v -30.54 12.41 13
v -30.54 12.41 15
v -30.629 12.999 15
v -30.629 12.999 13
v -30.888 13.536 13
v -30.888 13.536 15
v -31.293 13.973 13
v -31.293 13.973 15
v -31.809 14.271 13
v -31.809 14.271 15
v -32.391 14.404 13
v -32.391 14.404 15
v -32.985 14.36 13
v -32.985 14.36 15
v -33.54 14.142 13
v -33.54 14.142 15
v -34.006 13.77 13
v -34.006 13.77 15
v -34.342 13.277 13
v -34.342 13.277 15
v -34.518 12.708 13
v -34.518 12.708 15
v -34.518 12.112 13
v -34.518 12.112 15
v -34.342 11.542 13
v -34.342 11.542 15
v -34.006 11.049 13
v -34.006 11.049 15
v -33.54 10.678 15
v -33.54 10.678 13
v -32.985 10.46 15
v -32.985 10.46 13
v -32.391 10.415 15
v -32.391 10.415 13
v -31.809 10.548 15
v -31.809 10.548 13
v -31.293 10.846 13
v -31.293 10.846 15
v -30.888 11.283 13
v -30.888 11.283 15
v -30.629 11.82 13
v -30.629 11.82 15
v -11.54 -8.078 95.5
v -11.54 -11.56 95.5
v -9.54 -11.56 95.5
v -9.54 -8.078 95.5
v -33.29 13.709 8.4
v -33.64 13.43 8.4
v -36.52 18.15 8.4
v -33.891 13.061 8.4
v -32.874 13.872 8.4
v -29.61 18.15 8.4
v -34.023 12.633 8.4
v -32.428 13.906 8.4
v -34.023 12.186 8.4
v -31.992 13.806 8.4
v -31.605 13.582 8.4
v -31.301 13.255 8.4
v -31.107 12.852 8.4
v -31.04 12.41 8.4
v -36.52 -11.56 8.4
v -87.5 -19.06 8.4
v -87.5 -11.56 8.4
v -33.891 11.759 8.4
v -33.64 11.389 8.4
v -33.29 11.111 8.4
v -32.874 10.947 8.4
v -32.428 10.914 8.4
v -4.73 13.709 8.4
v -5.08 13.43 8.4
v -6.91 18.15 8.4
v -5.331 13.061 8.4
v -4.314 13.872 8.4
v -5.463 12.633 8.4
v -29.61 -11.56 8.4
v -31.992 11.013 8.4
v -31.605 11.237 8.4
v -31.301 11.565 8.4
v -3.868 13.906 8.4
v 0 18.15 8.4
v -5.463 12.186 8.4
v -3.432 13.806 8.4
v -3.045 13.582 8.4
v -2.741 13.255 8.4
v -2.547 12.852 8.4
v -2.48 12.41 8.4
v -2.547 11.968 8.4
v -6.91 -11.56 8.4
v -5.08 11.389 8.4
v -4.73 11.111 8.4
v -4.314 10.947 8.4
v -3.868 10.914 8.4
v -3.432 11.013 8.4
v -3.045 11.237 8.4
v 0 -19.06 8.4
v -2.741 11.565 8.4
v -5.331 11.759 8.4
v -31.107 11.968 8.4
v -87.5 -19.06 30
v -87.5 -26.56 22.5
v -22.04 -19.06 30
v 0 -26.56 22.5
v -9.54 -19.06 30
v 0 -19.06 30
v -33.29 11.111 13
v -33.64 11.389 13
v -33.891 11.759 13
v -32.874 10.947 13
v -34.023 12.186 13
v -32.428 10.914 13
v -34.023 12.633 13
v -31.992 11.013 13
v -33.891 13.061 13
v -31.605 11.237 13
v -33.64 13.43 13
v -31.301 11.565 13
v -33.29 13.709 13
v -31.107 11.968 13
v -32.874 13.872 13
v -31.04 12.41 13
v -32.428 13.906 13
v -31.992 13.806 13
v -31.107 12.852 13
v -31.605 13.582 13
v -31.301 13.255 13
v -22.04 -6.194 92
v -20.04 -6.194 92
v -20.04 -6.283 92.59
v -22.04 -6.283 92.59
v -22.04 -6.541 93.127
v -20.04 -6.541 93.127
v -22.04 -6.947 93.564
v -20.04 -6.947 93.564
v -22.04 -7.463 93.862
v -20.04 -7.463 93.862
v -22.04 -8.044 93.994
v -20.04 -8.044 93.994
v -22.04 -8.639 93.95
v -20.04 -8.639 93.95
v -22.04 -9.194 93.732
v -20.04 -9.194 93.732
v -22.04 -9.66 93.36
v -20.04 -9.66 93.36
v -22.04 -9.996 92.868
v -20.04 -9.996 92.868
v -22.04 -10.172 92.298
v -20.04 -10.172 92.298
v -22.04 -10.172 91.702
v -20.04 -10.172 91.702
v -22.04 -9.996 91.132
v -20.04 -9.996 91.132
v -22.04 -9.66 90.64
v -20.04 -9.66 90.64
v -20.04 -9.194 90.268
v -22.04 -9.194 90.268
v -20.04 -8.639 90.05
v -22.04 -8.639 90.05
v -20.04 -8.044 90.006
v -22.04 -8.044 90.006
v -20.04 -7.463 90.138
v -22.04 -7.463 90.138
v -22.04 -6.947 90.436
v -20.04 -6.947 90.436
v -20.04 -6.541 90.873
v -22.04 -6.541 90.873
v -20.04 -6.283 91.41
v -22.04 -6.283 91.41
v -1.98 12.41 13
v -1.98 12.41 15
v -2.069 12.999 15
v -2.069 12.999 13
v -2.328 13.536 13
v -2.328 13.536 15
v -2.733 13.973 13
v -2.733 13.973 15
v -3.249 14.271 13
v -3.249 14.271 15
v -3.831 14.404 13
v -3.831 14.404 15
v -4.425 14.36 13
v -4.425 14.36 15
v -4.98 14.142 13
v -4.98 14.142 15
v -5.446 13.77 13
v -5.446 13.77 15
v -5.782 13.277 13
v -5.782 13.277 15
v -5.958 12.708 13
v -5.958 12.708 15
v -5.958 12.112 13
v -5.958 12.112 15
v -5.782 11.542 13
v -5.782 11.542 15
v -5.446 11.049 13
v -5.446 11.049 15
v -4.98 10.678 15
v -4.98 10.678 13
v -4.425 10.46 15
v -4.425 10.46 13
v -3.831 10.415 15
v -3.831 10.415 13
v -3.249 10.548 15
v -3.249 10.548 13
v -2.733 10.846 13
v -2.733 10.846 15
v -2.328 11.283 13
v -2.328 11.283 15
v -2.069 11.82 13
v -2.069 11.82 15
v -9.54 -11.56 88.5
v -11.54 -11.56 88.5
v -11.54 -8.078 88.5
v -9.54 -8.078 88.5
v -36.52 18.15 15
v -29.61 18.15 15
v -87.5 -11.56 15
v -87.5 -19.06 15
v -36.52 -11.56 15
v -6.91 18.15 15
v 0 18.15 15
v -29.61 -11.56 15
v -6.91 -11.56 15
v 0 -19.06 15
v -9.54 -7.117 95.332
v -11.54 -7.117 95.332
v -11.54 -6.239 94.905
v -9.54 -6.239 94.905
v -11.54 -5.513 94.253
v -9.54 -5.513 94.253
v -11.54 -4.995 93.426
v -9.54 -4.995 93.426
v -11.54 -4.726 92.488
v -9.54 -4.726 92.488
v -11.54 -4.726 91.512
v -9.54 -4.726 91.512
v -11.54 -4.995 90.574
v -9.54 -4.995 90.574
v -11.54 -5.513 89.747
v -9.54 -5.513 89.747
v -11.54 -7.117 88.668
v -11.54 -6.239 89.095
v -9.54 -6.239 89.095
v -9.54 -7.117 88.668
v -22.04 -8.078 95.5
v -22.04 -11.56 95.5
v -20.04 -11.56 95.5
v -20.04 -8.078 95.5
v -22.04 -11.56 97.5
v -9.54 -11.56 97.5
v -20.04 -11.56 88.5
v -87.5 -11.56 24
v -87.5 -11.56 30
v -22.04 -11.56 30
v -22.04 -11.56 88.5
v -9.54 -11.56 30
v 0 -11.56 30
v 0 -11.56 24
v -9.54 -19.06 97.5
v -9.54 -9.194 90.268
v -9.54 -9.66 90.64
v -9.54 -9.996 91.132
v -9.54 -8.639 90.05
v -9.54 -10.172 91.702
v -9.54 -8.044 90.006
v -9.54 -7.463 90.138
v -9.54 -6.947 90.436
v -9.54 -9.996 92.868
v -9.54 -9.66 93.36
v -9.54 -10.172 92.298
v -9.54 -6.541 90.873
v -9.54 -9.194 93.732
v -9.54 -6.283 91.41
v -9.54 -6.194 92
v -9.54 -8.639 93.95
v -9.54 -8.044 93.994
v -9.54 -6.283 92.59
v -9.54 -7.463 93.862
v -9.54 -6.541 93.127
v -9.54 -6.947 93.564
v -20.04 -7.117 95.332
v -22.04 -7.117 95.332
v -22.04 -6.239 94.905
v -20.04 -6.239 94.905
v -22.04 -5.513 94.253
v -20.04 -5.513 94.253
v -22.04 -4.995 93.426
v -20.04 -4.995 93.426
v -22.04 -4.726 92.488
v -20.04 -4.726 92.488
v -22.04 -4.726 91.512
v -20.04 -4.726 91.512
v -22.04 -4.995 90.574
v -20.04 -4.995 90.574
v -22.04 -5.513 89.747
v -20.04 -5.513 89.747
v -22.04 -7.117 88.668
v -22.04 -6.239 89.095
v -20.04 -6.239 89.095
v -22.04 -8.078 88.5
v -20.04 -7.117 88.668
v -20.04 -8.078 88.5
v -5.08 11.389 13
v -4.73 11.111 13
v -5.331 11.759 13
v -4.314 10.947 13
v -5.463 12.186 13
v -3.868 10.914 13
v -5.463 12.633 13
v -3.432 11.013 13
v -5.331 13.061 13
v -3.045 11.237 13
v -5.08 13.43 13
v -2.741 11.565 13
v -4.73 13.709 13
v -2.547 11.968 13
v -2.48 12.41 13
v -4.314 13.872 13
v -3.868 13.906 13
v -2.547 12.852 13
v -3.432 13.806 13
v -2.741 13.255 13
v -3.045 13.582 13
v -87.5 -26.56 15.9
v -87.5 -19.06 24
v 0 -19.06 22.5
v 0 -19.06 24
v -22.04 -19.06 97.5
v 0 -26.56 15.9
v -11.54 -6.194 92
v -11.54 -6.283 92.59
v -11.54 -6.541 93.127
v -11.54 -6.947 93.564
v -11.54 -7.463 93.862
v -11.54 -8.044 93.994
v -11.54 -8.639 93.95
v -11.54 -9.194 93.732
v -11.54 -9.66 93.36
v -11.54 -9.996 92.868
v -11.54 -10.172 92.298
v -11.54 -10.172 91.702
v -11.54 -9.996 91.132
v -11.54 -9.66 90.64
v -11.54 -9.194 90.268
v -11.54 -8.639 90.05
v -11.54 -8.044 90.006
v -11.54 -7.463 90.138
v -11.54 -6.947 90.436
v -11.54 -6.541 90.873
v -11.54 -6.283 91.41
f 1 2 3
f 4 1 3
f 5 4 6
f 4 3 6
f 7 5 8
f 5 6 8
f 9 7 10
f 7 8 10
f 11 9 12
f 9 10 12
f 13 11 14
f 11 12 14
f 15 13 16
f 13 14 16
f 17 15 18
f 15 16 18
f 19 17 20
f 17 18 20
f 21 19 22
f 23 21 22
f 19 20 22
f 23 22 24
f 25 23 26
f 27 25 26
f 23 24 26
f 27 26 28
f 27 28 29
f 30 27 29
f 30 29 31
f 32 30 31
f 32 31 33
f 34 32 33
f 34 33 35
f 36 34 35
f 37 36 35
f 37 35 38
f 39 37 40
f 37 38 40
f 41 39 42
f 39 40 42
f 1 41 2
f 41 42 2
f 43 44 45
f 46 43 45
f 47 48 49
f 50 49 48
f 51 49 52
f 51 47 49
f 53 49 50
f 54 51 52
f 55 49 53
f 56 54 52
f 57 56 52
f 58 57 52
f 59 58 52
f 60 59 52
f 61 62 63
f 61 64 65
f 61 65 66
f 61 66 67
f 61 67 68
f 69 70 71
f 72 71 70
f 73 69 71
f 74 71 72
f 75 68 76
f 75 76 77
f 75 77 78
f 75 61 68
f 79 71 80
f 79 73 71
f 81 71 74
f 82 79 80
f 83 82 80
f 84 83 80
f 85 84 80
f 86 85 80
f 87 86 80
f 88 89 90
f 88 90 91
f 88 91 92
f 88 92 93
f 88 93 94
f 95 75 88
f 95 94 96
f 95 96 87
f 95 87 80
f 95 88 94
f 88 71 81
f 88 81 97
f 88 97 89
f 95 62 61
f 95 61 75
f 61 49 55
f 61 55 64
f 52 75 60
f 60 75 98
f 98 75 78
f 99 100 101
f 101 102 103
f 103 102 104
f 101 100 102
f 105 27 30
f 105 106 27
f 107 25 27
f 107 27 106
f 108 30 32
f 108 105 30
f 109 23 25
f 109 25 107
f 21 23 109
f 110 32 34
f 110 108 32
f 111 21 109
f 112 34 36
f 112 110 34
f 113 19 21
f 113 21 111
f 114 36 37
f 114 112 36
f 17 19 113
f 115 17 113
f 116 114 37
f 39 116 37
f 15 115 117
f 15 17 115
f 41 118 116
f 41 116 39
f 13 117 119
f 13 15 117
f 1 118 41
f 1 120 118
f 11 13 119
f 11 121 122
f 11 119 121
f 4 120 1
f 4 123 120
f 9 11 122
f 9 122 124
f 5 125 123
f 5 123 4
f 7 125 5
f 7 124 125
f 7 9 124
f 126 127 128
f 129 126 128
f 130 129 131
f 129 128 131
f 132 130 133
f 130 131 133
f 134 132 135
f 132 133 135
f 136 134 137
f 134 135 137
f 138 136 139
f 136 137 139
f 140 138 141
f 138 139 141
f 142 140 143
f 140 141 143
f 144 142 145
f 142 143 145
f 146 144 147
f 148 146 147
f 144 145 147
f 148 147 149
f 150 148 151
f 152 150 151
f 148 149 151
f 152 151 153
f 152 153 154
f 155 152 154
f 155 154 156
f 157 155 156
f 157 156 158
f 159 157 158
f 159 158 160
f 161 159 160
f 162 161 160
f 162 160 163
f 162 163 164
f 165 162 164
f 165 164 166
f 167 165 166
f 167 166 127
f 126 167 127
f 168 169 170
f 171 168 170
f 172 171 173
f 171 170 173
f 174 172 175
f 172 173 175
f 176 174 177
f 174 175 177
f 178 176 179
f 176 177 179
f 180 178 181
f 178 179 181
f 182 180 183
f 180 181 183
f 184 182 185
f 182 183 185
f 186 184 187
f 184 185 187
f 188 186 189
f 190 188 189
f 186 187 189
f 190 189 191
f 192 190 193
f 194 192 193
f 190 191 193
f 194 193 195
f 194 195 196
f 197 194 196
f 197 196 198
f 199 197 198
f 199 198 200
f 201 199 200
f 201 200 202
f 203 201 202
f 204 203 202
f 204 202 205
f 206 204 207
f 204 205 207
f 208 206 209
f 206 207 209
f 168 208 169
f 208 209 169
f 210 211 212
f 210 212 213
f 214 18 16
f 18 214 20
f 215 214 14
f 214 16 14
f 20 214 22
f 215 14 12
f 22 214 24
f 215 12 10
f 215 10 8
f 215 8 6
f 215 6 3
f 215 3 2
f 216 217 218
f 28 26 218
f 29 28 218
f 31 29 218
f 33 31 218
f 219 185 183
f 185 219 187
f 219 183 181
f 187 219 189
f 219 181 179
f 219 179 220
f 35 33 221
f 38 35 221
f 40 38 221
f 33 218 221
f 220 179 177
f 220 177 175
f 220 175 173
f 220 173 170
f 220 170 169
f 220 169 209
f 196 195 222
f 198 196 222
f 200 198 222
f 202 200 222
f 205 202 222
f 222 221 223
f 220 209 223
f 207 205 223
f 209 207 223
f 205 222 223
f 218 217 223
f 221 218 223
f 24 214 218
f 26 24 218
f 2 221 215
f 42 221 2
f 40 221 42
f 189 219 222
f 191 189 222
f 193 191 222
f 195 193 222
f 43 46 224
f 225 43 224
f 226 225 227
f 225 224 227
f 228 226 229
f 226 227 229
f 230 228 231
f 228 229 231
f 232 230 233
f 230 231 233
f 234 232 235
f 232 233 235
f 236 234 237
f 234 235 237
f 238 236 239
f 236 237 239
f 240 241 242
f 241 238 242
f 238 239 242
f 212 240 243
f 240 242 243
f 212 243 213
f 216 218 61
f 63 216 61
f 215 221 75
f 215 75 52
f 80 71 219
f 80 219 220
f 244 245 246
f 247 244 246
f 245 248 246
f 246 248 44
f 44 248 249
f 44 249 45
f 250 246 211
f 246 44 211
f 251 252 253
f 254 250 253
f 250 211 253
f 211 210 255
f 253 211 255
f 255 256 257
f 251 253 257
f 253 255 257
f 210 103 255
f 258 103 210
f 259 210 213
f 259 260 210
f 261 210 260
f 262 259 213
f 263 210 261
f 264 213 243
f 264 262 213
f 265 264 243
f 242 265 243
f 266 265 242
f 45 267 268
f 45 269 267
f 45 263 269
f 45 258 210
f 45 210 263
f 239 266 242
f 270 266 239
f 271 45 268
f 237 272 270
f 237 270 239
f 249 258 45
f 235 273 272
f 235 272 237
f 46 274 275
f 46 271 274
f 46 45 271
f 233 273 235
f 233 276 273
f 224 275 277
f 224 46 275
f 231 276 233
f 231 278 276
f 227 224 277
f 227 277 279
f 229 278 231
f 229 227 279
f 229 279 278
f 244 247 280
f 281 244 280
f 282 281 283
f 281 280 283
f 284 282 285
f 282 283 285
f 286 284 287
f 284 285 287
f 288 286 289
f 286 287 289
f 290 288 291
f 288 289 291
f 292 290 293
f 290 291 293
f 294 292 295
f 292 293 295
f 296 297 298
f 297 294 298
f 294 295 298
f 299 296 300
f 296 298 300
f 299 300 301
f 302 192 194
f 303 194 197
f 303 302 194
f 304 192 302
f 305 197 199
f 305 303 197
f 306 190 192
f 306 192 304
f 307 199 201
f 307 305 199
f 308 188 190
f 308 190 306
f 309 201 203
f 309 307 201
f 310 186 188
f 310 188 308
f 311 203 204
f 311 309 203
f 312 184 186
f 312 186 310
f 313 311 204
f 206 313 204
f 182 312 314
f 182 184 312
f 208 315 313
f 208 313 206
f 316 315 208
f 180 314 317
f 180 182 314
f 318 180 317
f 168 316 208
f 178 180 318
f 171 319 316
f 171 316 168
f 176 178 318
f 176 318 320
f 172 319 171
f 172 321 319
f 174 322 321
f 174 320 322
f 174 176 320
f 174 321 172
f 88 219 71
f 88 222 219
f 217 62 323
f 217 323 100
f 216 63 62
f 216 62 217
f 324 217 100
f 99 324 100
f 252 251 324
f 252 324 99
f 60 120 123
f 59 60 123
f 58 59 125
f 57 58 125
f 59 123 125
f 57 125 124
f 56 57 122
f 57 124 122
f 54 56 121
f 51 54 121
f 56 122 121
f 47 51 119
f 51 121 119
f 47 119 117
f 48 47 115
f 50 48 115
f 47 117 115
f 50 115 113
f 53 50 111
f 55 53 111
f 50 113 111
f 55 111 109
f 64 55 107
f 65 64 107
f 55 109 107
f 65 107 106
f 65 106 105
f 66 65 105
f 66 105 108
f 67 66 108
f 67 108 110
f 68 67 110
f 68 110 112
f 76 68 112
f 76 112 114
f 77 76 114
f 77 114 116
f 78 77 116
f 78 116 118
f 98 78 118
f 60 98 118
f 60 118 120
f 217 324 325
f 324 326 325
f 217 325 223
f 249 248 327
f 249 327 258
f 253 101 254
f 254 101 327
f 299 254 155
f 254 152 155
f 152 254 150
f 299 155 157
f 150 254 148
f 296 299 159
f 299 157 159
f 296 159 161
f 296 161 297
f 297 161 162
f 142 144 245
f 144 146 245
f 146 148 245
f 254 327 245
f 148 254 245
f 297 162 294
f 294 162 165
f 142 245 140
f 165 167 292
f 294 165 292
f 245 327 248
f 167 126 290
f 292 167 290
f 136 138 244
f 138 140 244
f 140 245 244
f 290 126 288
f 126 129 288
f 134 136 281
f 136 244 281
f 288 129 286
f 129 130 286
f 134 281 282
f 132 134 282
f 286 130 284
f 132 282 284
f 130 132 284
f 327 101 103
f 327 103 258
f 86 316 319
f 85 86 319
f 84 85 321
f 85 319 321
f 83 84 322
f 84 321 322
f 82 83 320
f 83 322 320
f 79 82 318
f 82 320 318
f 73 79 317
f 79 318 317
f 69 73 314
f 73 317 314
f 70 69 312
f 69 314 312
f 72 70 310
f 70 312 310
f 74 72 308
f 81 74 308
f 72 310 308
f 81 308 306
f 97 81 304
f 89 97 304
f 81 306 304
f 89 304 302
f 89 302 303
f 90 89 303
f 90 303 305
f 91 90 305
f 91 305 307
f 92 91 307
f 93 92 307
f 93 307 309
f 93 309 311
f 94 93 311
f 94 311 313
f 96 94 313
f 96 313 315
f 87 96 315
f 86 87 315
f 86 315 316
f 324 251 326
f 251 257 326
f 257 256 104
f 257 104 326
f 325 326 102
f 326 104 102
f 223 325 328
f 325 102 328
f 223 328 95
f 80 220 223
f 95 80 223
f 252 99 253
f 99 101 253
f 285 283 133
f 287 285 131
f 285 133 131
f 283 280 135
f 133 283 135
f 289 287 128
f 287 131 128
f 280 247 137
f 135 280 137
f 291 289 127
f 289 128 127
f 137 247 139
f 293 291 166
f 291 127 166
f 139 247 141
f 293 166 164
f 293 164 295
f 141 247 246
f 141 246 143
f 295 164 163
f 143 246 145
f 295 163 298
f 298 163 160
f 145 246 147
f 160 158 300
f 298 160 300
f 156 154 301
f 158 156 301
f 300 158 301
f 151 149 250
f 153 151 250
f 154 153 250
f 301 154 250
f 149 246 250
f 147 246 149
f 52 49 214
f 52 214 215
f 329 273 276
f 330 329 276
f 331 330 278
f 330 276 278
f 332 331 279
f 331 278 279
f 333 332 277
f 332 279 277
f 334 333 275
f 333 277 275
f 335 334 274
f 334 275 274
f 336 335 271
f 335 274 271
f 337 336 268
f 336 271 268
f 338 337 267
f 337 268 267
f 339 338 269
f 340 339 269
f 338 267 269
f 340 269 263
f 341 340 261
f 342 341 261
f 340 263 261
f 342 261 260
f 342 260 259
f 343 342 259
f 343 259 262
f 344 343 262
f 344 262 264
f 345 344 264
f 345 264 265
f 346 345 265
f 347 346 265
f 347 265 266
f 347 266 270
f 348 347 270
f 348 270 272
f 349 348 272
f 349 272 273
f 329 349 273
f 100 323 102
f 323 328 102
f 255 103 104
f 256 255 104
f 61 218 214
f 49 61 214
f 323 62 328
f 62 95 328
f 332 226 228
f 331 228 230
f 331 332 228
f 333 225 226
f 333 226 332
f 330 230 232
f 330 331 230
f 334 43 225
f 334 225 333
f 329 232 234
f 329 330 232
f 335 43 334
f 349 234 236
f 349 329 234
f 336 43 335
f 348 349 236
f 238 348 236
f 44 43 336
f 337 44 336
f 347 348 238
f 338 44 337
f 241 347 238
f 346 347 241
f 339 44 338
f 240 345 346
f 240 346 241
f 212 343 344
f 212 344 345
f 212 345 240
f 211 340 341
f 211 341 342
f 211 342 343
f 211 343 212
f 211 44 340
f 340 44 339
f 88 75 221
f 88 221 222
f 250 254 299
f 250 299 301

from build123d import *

# Parameters (mm, degrees)
BOSS_EXTRUDE1_DEPTH     = 15
SKETCH2_W               = 71.983860539
SKETCH2_H               = 7.5
BOSS_EXTRUDE2_DEPTH     = 15
SKETCH3_W               = 71.983860539
SKETCH3_H               = 7.5
BOSS_EXTRUDE3_DEPTH     = 7.5
SKETCH4_W               = 8.4
SKETCH4_H               = 26.56
CUT_EXTRUDE1_DEPTH      = 83.383916987
SKETCH5_W               = 71.983860539
SKETCH5_H               = 10
BOSS_EXTRUDE4_DEPTH     = 23.8
SKETCH6_W               = 61.591879109
SKETCH6_H               = 40.125144004
CUT_EXTRUDE2_DEPTH      = 1.984
ESQUISSE1_W             = 10.09
ESQUISSE1_H             = 11.56
ENL_V_MAT_EXTRU_1_DEPTH = 10
ESQUISSE2_W             = 4.91
ESQUISSE2_H             = 11.56
BOSS_EXTRU_1_DEPTH      = 6.6
ESQUISSE3_W             = 12.5
ESQUISSE3_H             = 15
BOSS_EXTRU_5_DEPTH      = 67.5
ESQUISSE4_W             = 22.7
ESQUISSE4_H             = 17.2
BOSS_EXTRU_6_DEPTH      = 5
ESQUISSE5_W             = 15
ESQUISSE5_H             = 11.56
ENL_V_MAT_EXTRU_4_DEPTH = 117.379654903
SKETCH7_W               = 1.5
SKETCH7_H               = 7.5
CUT_EXTRUDE3_DEPTH      = 123.929508563
BOSS_EXTRUDE5_REACH     = 137.469
SKETCH8_W               = 2
SKETCH8_H               = 15
SKETCH9_W               = 2
SKETCH9_H               = 15
CUT_EXTRUDE4_DEPTH      = 67.5
BOSS_EXTRUDE6_START     = -6.6
SKETCH10_W              = 2
SKETCH10_H              = 11.56
BOSS_EXTRUDE6_DEPTH     = 6.6
SKETCH12_W              = 2
SKETCH12_H              = 11.56
CUT_EXTRUDE6_DEPTH      = 112.407648191
SKETCH13_W              = 4
SKETCH13_H              = 11.56
BOSS_EXTRUDE7_DEPTH     = 6.6
SKETCH14_W              = 2
SKETCH14_H              = 17.2
CUT_EXTRUDE7_DEPTH      = 5
SKETCH15_W              = 2
SKETCH15_H              = 17.2
BOSS_EXTRUDE8_DEPTH     = 15
SKETCH16_W              = 40.389860539
SKETCH16_H              = 23.8
CUT_EXTRUDE8_DEPTH      = 122.16296495
SKETCH21_W              = 6.91
SKETCH21_H              = 23.8
CUT_EXTRUDE11_DEPTH     = 122.16296495
SKETCH22_W              = 22.7
SKETCH22_H              = 6.6
CUT_EXTRUDE12_DEPTH     = 122.16296495
SKETCH23_W              = 17.2
SKETCH23_H              = 7.5
CUT_EXTRUDE13_DEPTH     = 109.825660735
SKETCH26_R              = 1.05
CUT_EXTRUDE15_DEPTH     = 117.379654903
SKETCH27_R              = 1.05
CUT_EXTRUDE16_DEPTH     = 117.379654903
SKETCH28_W              = 67.5
SKETCH28_H              = 7.5
CUT_EXTRUDE17_DEPTH     = 112.85629988
CUT_EXTRUDE18_DEPTH     = 123.929508563
CUT_EXTRUDE19_DEPTH     = 123.929508563
SKETCH32_W              = 2
SKETCH32_H              = 7
BOSS_EXTRUDE10_DEPTH    = 10
SKETCH33_W              = 2
SKETCH33_H              = 7
BOSS_EXTRUDE11_DEPTH    = 10
CUT_EXTRUDE20_DEPTH     = 118.758559504
CUT_EXTRUDE21_DEPTH     = 118.758559504
SKETCH40_R              = 2
CUT_EXTRUDE22_DEPTH     = 118.758559504
BOSS_EXTRUDE12_DEPTH    = 17.5
SKETCH42_W              = 6.91
SKETCH42_H              = 6.6
BOSS_EXTRUDE13_DEPTH    = 18.14971438
SKETCH43_R              = 1.5
CUT_EXTRUDE23_DEPTH     = 124.158065892
SKETCH44_R              = 2
CUT_EXTRUDE24_DEPTH     = 2
SKETCH45_W              = 3.244883141
SKETCH45_H              = 3.430305034
SKETCH45_W_2            = 4.17199261
BOSS_EXTRUDE14_DEPTH    = 6.6
SKETCH46_W              = 22.7
SKETCH46_H              = 17.2
CUT_EXTRUDE25_DEPTH     = 135.332210295


with BuildPart() as part:
    # Sketch1 → Boss-Extrude1 (new body)
    with BuildSketch(Plane.XY):
        Polygon((0, 0), (0, -26.56), (-71.983860539, -26.56), (-71.983860539, -11.56), (-52.61, -11.56), (-52.61, 0), (-37.61, 0), (-37.61, -11.56), (-15, -11.56), (-15, 0), align=None)
    extrude(amount=BOSS_EXTRUDE1_DEPTH)

    # Sketch2 → Boss-Extrude2 (add)
    with BuildSketch(Plane.XY.offset(15)):
        with Locations((-35.99193027, -22.81)):
            Rectangle(SKETCH2_W, SKETCH2_H)
    extrude(amount=BOSS_EXTRUDE2_DEPTH)

    # Sketch3 → Boss-Extrude3 (add)
    with BuildSketch(Plane(origin=(0, -19.06, 0), x_dir=(1, 0, 0), z_dir=(0, 1, 0))):
        with Locations((-35.99193027, -26.25)):
            Rectangle(SKETCH3_W, SKETCH3_H)
    extrude(amount=BOSS_EXTRUDE3_DEPTH)

    # Sketch4 → Cut-Extrude1 (cut, through all)
    with BuildSketch(Plane(origin=(0, 0, 0), x_dir=(0, 0, -1), z_dir=(1, 0, 0))):
        with Locations((-4.2, -13.28)):
            Rectangle(SKETCH4_W, SKETCH4_H)
    extrude(amount=-CUT_EXTRUDE1_DEPTH, mode=Mode.SUBTRACT)

    # Sketch5 → Boss-Extrude4 (add)
    with BuildSketch(Plane(origin=(0, 0, 8.4), x_dir=(-1, 0, 0), z_dir=(0, 0, -1))):
        with Locations((35.99193027, -21.56)):
            Rectangle(SKETCH5_W, SKETCH5_H)
    extrude(amount=BOSS_EXTRUDE4_DEPTH)

    # Sketch6 → Cut-Extrude2 (cut)
    with BuildSketch(Plane.ZY.offset(71.983860539)):
        with Locations((3.866783639, -17.156311896)):
            Rectangle(SKETCH6_W, SKETCH6_H)
    extrude(amount=-CUT_EXTRUDE2_DEPTH, mode=Mode.SUBTRACT)

    # Esquisse1 → Enlèv. mat.-Extru.1 (cut)
    with BuildSketch(Plane.XY.offset(15)):
        with Locations((-9.955, -5.78)):
            Rectangle(ESQUISSE1_W, ESQUISSE1_H)
    extrude(amount=-ENL_V_MAT_EXTRU_1_DEPTH, mode=Mode.SUBTRACT)

    # Esquisse2 → Boss.-Extru.1 (add)
    with BuildSketch(Plane(origin=(0, 0, 8.4), x_dir=(-1, 0, 0), z_dir=(0, 0, -1))):
        with Locations((30.065, -5.78)):
            Rectangle(ESQUISSE2_W, ESQUISSE2_H)
    extrude(amount=-BOSS_EXTRU_1_DEPTH)

    # Esquisse3 → Boss.-Extru.5 (add)
    with BuildSketch(Plane.XY.offset(30)):
        with Locations((-13.79, -19.06)):
            Rectangle(ESQUISSE3_W, ESQUISSE3_H)
    extrude(amount=BOSS_EXTRU_5_DEPTH)

    # Esquisse4 → Boss.-Extru.6 (add)
    with BuildSketch(Plane(origin=(0, -16.56, 0), x_dir=(1, 0, 0), z_dir=(0, 1, 0))):
        with Locations((-16.26, 0.2)):
            Rectangle(ESQUISSE4_W, ESQUISSE4_H)
    extrude(amount=BOSS_EXTRU_6_DEPTH)

    # Esquisse5 → Enlèv. mat.-Extru.4 (cut, through all)
    with BuildSketch(Plane(origin=(0, 0, 8.4), x_dir=(-1, 0, 0), z_dir=(0, 0, -1))):
        with Locations((45.11, -5.78)):
            Rectangle(ESQUISSE5_W, ESQUISSE5_H)
    extrude(amount=-ENL_V_MAT_EXTRU_4_DEPTH, mode=Mode.SUBTRACT)

    # Sketch7 → Cut-Extrude3 (cut, through all)
    with BuildSketch(Plane(origin=(0, 0, 0), x_dir=(0, 0, -1), z_dir=(1, 0, 0))):
        with Locations((-23.25, -15.31)):
            Rectangle(SKETCH7_W, SKETCH7_H)
    extrude(amount=-CUT_EXTRUDE3_DEPTH, mode=Mode.SUBTRACT)

    # Sketch8 → Boss-Extrude5 (add, up to next)
    with BuildSketch(Plane.XY.offset(97.5), mode=Mode.PRIVATE) as boss_extrude5_sk1:
        with Locations((-21.04, -19.06)):
            Rectangle(SKETCH8_W, SKETCH8_H)
    boss_extrude5_tool1 = extrude(boss_extrude5_sk1.sketch, amount=-BOSS_EXTRUDE5_REACH, mode=Mode.PRIVATE) - part.part
    add(boss_extrude5_tool1.solids().sort_by_distance((-21.04, -19.06, 97.5))[0])

    # Sketch9 → Cut-Extrude4 (cut)
    with BuildSketch(Plane.XY.offset(97.5)):
        with Locations((-8.54, -19.06)):
            Rectangle(SKETCH9_W, SKETCH9_H)
    extrude(amount=-CUT_EXTRUDE4_DEPTH, mode=Mode.SUBTRACT)

    # Sketch10 → Boss-Extrude6 (add)
    with BuildSketch(Plane.XY.offset(15).offset(BOSS_EXTRUDE6_START)):
        with Locations((-5.91, -5.78)):
            Rectangle(SKETCH10_W, SKETCH10_H)
    extrude(amount=BOSS_EXTRUDE6_DEPTH)

    # Sketch12 → Cut-Extrude6 (cut, through all)
    with BuildSketch(Plane.XY.offset(15)):
        with Locations((-28.61, -5.78)):
            Rectangle(SKETCH12_W, SKETCH12_H)
    extrude(amount=-CUT_EXTRUDE6_DEPTH, mode=Mode.SUBTRACT)

    # Sketch13 → Boss-Extrude7 (add)
    with BuildSketch(Plane.XY.offset(15)):
        with Locations((-34.52, -5.78)):
            Rectangle(SKETCH13_W, SKETCH13_H)
    extrude(amount=-BOSS_EXTRUDE7_DEPTH)

    # Sketch14 → Cut-Extrude7 (cut)
    with BuildSketch(Plane(origin=(0, -11.56, 0), x_dir=(1, 0, 0), z_dir=(0, 1, 0))):
        with Locations((-5.91, 0.2)):
            Rectangle(SKETCH14_W, SKETCH14_H)
    extrude(amount=-CUT_EXTRUDE7_DEPTH, mode=Mode.SUBTRACT)

    # Sketch15 → Boss-Extrude8 (add)
    with BuildSketch(Plane(origin=(0, -11.56, 0), x_dir=(1, 0, 0), z_dir=(0, 1, 0))):
        with Locations((-28.61, 0.2)):
            Rectangle(SKETCH15_W, SKETCH15_H)
    extrude(amount=-BOSS_EXTRUDE8_DEPTH)

    # Sketch16 → Cut-Extrude8 (cut, through all)
    with BuildSketch(Plane(origin=(0, -16.56, 0), x_dir=(1, 0, 0), z_dir=(0, 1, 0))):
        with Locations((-49.80493027, 3.5)):
            Rectangle(SKETCH16_W, SKETCH16_H)
    extrude(amount=-CUT_EXTRUDE8_DEPTH, mode=Mode.SUBTRACT)

    # Sketch21 → Cut-Extrude11 (cut, through all)
    with BuildSketch(Plane(origin=(0, -16.56, 0), x_dir=(1, 0, 0), z_dir=(0, 1, 0))):
        with Locations((-3.455, 3.5)):
            Rectangle(SKETCH21_W, SKETCH21_H)
    extrude(amount=-CUT_EXTRUDE11_DEPTH, mode=Mode.SUBTRACT)

    # Sketch22 → Cut-Extrude12 (cut, through all)
    with BuildSketch(Plane(origin=(0, -16.56, 0), x_dir=(1, 0, 0), z_dir=(0, 1, 0))):
        with Locations((-18.26, 12.1)):
            Rectangle(SKETCH22_W, SKETCH22_H)
    extrude(amount=-CUT_EXTRUDE12_DEPTH, mode=Mode.SUBTRACT)

    # Sketch23 → Cut-Extrude13 (cut, through all)
    with BuildSketch(Plane.ZY.offset(29.61)):
        with Locations((-0.2, -22.81)):
            Rectangle(SKETCH23_W, SKETCH23_H)
    extrude(amount=-CUT_EXTRUDE13_DEPTH, mode=Mode.SUBTRACT)

    # Sketch26 → Cut-Extrude15 (cut, through all)
    with BuildSketch(Plane(origin=(0, 0, 8.4), x_dir=(-1, 0, 0), z_dir=(0, 0, -1))):
        with Locations(Location((3.98, -5.74, 0), (0, 0, 90))):
            Circle(SKETCH26_R)
    extrude(amount=-CUT_EXTRUDE15_DEPTH, mode=Mode.SUBTRACT)

    # Sketch27 → Cut-Extrude16 (cut, through all)
    with BuildSketch(Plane(origin=(0, 0, 8.4), x_dir=(-1, 0, 0), z_dir=(0, 0, -1))):
        with Locations(Location((32.54, -5.74, 0), (0, 0, 90))):
            Circle(SKETCH27_R)
    extrude(amount=-CUT_EXTRUDE16_DEPTH, mode=Mode.SUBTRACT)

    # Sketch28 → Cut-Extrude17 (cut, through all)
    with BuildSketch(Plane.ZY.offset(22.04)):
        with Locations((63.75, -22.81)):
            Rectangle(SKETCH28_W, SKETCH28_H)
    extrude(amount=-CUT_EXTRUDE17_DEPTH, mode=Mode.SUBTRACT)

    # Sketch29 → Cut-Extrude18 (cut, through all)
    with BuildSketch(Plane.ZY.offset(69.999860539)):
        Polygon((8.4, -19.06), (15.9, -26.56), (8.4, -26.56), align=None)
    extrude(amount=-CUT_EXTRUDE18_DEPTH, mode=Mode.SUBTRACT)

    # Sketch30 → Cut-Extrude19 (cut, through all)
    with BuildSketch(Plane.ZY.offset(69.999860539)):
        Polygon((30, -19.06), (22.5, -26.56), (30, -26.56), align=None)
    extrude(amount=-CUT_EXTRUDE19_DEPTH, mode=Mode.SUBTRACT)

    # Sketch32 → Boss-Extrude10 (add)
    with BuildSketch(Plane(origin=(0, -11.56, 0), x_dir=(1, 0, 0), z_dir=(0, 1, 0))):
        with Locations((-21.04, -92)):
            Rectangle(SKETCH32_W, SKETCH32_H)
    extrude(amount=BOSS_EXTRUDE10_DEPTH)

    # Sketch33 → Boss-Extrude11 (add)
    with BuildSketch(Plane(origin=(0, -11.56, 0), x_dir=(1, 0, 0), z_dir=(0, 1, 0))):
        with Locations((-10.54, -92)):
            Rectangle(SKETCH33_W, SKETCH33_H)
    extrude(amount=BOSS_EXTRUDE11_DEPTH)

    # Sketch37 → Cut-Extrude20 (cut, through all)
    with BuildSketch(Plane(origin=(-9.54, 0, 0), x_dir=(0, 0, -1), z_dir=(1, 0, 0))):
        with BuildLine():
            Line((-95.5, -1.56), (-95.5, -5.06))
            ThreePointArc((-95.5, -5.06), (-94.474873734, -2.585126266), (-92, -1.56))
            Line((-92, -1.56), (-95.5, -1.56))
        make_face()
        with BuildLine():
            ThreePointArc((-92, -1.56), (-89.525126266, -2.585126266), (-88.5, -5.06))
            Line((-88.5, -5.06), (-88.5, -1.56))
            Line((-88.5, -1.56), (-92, -1.56))
        make_face()
    extrude(amount=-CUT_EXTRUDE20_DEPTH, mode=Mode.SUBTRACT)

    # Sketch39 → Cut-Extrude21 (cut, through all)
    with BuildSketch(Plane(origin=(-9.54, 0, 0), x_dir=(0, 0, -1), z_dir=(1, 0, 0))):
        with BuildLine():
            ThreePointArc((-95.5, -8.077882472), (-92, -4.692017531), (-88.5, -8.077882472))
            Line((-88.5, -8.077882472), (-88.5, -5.06))
            ThreePointArc((-88.5, -5.06), (-92, -1.56), (-95.5, -5.06))
            Line((-95.5, -5.06), (-95.5, -8.077882472))
        make_face()
    extrude(amount=-CUT_EXTRUDE21_DEPTH, mode=Mode.SUBTRACT)

    # Sketch40 → Cut-Extrude22 (cut, through all)
    with BuildSketch(Plane(origin=(-9.54, 0, 0), x_dir=(0, 0, -1), z_dir=(1, 0, 0))):
        with Locations(Location((-92, -8.193941236, 0), (0, 0, 90))):
            Circle(SKETCH40_R)
    extrude(amount=-CUT_EXTRUDE22_DEPTH, mode=Mode.SUBTRACT)

    # Sketch41 → Boss-Extrude12 (add)
    with BuildSketch(Plane.ZY.offset(69.999860539)):
        Polygon((8.4, -11.56), (8.4, -19.06), (15.9, -26.56), (22.5, -26.56), (30, -19.06), (30, -11.56), (24, -11.56), (24, -19.06), (15, -19.06), (15, -11.56), align=None)
    extrude(amount=BOSS_EXTRUDE12_DEPTH)

    # Sketch42 → Boss-Extrude13 (add)
    with BuildSketch(Plane(origin=(0, 0, 0), x_dir=(1, 0, 0), z_dir=(0, 1, 0))):
        with Locations((-3.455, -11.7)):
            Rectangle(SKETCH42_W, SKETCH42_H)
        with Locations((-33.065, -11.7)):
            Rectangle(SKETCH42_W, SKETCH42_H)
    extrude(amount=BOSS_EXTRUDE13_DEPTH)

    # Sketch43 → Cut-Extrude23 (cut, through all)
    with BuildSketch(Plane.XY.offset(15)):
        with Locations((-32.54, 12.40971438)):
            Circle(SKETCH43_R)
        with Locations((-3.98, 12.40971438)):
            Circle(SKETCH43_R)
    extrude(amount=-CUT_EXTRUDE23_DEPTH, mode=Mode.SUBTRACT)

    # Sketch44 → Cut-Extrude24 (cut)
    with BuildSketch(Plane.XY.offset(15)):
        with Locations((-32.54, 12.40971438)):
            Circle(SKETCH44_R)
        with Locations((-3.98, 12.40971438)):
            Circle(SKETCH44_R)
    extrude(amount=-CUT_EXTRUDE24_DEPTH, mode=Mode.SUBTRACT)

    # Sketch45 → Boss-Extrude14 (add)
    with BuildSketch(Plane.XY.offset(15)):
        with Locations((-32.392839278, -5.503096066)):
            Rectangle(SKETCH45_W, SKETCH45_H)
        with Locations((-3.930578587, -5.503096066)):
            Rectangle(SKETCH45_W_2, SKETCH45_H)
    extrude(amount=-BOSS_EXTRUDE14_DEPTH)

    # Sketch46 → Cut-Extrude25 (cut, through all)
    with BuildSketch(Plane(origin=(0, -11.56, 0), x_dir=(1, 0, 0), z_dir=(0, 1, 0))):
        with Locations((-18.26, 0.2)):
            Rectangle(SKETCH46_W, SKETCH46_H)
    extrude(amount=-CUT_EXTRUDE25_DEPTH, mode=Mode.SUBTRACT)


solid = part.part
